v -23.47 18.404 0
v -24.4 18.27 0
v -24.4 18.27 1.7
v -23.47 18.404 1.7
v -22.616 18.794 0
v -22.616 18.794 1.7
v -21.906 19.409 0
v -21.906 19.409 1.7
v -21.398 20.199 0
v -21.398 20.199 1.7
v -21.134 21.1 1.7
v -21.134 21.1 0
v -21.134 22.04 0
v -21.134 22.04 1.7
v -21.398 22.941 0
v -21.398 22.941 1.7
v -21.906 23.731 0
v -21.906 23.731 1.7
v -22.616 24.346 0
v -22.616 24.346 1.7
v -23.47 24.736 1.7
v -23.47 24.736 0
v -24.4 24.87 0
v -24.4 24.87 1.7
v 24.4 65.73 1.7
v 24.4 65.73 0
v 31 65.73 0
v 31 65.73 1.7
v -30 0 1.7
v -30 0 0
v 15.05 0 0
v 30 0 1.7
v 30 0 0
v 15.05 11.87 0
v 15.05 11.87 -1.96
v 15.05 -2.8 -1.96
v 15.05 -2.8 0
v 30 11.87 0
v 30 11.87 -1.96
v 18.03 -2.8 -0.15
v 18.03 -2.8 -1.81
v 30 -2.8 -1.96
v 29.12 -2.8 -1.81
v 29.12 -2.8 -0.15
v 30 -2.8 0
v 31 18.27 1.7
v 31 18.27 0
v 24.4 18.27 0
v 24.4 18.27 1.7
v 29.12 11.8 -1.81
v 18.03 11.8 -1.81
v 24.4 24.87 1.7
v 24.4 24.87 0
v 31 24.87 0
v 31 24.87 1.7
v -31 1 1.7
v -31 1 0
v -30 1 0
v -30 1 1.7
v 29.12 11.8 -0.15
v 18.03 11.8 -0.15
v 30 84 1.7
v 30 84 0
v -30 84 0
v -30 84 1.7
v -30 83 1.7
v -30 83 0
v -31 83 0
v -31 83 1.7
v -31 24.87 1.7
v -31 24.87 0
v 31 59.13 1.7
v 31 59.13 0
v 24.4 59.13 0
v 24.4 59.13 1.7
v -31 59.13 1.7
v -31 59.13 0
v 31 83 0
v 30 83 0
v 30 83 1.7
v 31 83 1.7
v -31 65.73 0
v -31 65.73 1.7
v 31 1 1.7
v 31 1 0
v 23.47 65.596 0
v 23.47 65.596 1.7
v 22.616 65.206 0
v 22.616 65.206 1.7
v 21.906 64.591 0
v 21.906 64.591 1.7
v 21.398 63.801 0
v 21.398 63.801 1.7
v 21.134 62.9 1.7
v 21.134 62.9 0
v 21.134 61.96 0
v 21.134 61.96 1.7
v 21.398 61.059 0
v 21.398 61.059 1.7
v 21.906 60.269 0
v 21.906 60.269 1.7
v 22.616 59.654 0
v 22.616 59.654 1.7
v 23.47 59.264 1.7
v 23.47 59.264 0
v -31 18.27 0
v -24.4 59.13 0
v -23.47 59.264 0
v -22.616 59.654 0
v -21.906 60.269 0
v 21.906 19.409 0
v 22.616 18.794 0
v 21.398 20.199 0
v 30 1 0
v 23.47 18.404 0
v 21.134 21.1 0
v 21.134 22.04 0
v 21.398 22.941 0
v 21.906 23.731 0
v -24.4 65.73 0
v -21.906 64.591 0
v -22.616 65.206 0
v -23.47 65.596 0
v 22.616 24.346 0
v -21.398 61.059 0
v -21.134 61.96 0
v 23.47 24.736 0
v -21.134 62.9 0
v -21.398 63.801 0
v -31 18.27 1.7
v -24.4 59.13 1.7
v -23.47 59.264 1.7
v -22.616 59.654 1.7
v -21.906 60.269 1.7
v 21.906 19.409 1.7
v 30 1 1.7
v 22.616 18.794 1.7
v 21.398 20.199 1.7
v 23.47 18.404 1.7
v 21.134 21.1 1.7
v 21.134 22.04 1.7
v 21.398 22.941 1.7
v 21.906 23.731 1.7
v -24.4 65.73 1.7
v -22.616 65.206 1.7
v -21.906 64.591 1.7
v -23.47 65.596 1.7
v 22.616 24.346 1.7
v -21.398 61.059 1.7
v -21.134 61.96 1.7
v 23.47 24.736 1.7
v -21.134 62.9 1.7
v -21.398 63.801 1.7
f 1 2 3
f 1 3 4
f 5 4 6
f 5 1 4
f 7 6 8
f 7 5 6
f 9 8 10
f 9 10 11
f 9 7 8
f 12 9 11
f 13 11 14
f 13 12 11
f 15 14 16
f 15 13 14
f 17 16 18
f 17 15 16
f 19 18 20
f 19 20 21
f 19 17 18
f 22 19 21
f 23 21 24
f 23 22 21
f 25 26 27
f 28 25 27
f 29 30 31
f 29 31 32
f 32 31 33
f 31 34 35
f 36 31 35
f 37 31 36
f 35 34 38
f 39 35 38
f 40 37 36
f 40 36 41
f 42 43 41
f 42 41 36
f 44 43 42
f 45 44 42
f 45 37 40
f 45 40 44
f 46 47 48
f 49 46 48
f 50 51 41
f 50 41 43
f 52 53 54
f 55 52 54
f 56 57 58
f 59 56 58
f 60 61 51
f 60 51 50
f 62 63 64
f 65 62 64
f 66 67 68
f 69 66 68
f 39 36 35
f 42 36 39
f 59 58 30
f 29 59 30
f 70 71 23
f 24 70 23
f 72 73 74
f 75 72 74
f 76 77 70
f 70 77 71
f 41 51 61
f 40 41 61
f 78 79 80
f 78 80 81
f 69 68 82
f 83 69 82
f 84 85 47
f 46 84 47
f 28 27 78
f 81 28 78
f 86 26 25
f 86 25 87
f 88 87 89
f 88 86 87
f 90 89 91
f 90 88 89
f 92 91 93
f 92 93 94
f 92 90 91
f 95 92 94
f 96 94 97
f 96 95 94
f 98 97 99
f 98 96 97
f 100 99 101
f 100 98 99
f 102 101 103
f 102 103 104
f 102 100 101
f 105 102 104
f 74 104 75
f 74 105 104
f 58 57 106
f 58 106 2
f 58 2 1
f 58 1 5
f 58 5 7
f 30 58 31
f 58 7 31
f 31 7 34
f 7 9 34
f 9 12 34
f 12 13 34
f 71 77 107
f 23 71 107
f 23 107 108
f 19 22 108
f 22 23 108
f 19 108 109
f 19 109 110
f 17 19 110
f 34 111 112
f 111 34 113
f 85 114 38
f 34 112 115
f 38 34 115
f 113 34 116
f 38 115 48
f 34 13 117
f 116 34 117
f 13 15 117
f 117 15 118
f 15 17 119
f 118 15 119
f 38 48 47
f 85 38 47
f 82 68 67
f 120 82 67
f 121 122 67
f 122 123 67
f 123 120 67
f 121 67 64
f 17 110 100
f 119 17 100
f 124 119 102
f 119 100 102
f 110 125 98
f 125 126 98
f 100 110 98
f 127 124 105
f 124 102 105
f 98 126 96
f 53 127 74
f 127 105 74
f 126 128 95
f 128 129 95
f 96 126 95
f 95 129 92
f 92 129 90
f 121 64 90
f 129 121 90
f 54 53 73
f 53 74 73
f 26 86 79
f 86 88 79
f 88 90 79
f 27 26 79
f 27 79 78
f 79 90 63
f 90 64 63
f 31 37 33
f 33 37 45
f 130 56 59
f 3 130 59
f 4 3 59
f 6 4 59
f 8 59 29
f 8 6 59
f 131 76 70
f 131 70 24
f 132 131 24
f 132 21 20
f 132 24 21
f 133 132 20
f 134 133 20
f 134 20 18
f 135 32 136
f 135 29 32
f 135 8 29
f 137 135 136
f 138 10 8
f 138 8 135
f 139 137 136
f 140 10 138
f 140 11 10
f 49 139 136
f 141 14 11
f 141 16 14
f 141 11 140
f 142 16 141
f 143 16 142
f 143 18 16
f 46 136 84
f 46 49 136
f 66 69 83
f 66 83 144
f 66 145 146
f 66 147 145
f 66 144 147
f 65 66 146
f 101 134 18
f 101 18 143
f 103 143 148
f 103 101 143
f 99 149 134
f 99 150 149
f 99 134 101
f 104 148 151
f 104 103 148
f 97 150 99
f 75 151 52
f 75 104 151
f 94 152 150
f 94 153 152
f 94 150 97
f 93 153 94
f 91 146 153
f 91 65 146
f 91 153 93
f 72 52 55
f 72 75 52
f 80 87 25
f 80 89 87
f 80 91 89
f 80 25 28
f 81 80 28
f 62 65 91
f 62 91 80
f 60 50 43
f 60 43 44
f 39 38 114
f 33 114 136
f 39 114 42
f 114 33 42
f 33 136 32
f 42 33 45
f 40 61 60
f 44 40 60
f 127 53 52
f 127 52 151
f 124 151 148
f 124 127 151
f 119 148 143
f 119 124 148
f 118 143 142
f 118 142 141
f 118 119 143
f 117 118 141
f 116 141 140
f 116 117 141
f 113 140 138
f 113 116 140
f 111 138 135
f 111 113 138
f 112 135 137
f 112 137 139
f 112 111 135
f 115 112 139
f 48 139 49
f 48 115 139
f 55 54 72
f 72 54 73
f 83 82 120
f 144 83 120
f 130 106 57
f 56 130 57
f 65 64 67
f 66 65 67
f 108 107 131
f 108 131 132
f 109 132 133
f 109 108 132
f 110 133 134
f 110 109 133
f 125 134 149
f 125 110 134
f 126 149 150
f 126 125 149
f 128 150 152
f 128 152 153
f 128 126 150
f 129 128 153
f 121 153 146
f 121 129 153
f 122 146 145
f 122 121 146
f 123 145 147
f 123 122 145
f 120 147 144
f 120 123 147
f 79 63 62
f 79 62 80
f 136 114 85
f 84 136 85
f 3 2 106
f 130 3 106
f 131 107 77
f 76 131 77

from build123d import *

# Parameters (mm, degrees)
PAD_DEPTH       = 1.7
SKETCH009_W     = 14.95
SKETCH009_H     = 14.67
PAD002_DEPTH    = 1.96
SKETCH017_W     = 11.09
SKETCH017_H     = 1.66
POCKET006_DEPTH = 14.6


with BuildPart() as part:
    # Sketch → Pad (new body)
    with BuildSketch(Plane.XY):
        with BuildLine():
            Line((0, 0), (30, 0))
            Line((30, 0), (30, 1))
            Line((30, 1), (31, 1))
            Line((31, 1), (31, 18.27))
            Line((31, 18.27), (24.4, 18.27))
            ThreePointArc((24.4, 24.87), (21.1, 21.57), (24.4, 18.27))
            Line((24.4, 24.87), (31, 24.87))
            Line((31, 24.87), (31, 59.13))
            Line((31, 59.13), (24.4, 59.13))
            ThreePointArc((24.4, 65.73), (21.1, 62.43), (24.4, 59.13))
            Line((24.4, 65.73), (31, 65.73))
            Line((31, 65.73), (31, 83))
            Line((30, 83), (31, 83))
            Line((30, 84), (30, 83))
            Line((30, 84), (0, 84))
            Line((0, 84), (-30, 84))
            Line((-30, 84), (-30, 83))
            Line((-30, 83), (-31, 83))
            Line((-31, 83), (-31, 65.73))
            Line((-31, 65.73), (-24.4, 65.73))
            ThreePointArc((-24.4, 59.13), (-21.1, 62.43), (-24.4, 65.73))
            Line((-24.4, 59.13), (-31, 59.13))
            Line((-31, 59.13), (-31, 24.87))
            Line((-31, 24.87), (-24.4, 24.87))
            ThreePointArc((-24.4, 18.27), (-21.1, 21.57), (-24.4, 24.87))
            Line((-24.4, 18.27), (-31, 18.27))
            Line((-31, 18.27), (-31, 1))
            Line((-31, 1), (-30, 1))
            Line((-30, 1), (-30, 0))
            Line((-30, 0), (0, 0))
        make_face()
    extrude(amount=PAD_DEPTH)

    # Sketch009 → Pad002 (new body)
    with BuildSketch(Plane(origin=(0, 0, 0), x_dir=(1, 0, 0), z_dir=(0, 0, -1))):
        with Locations((22.525, -4.535)):
            Rectangle(SKETCH009_W, SKETCH009_H)
    extrude(amount=PAD002_DEPTH)

    # Sketch017 → Pocket006 (cut)
    with BuildSketch(Plane.XZ.offset(2.8)):
        with Locations((23.575, -0.98)):
            Rectangle(SKETCH017_W, SKETCH017_H)
    extrude(amount=-POCKET006_DEPTH, mode=Mode.SUBTRACT)


solid = part.part
